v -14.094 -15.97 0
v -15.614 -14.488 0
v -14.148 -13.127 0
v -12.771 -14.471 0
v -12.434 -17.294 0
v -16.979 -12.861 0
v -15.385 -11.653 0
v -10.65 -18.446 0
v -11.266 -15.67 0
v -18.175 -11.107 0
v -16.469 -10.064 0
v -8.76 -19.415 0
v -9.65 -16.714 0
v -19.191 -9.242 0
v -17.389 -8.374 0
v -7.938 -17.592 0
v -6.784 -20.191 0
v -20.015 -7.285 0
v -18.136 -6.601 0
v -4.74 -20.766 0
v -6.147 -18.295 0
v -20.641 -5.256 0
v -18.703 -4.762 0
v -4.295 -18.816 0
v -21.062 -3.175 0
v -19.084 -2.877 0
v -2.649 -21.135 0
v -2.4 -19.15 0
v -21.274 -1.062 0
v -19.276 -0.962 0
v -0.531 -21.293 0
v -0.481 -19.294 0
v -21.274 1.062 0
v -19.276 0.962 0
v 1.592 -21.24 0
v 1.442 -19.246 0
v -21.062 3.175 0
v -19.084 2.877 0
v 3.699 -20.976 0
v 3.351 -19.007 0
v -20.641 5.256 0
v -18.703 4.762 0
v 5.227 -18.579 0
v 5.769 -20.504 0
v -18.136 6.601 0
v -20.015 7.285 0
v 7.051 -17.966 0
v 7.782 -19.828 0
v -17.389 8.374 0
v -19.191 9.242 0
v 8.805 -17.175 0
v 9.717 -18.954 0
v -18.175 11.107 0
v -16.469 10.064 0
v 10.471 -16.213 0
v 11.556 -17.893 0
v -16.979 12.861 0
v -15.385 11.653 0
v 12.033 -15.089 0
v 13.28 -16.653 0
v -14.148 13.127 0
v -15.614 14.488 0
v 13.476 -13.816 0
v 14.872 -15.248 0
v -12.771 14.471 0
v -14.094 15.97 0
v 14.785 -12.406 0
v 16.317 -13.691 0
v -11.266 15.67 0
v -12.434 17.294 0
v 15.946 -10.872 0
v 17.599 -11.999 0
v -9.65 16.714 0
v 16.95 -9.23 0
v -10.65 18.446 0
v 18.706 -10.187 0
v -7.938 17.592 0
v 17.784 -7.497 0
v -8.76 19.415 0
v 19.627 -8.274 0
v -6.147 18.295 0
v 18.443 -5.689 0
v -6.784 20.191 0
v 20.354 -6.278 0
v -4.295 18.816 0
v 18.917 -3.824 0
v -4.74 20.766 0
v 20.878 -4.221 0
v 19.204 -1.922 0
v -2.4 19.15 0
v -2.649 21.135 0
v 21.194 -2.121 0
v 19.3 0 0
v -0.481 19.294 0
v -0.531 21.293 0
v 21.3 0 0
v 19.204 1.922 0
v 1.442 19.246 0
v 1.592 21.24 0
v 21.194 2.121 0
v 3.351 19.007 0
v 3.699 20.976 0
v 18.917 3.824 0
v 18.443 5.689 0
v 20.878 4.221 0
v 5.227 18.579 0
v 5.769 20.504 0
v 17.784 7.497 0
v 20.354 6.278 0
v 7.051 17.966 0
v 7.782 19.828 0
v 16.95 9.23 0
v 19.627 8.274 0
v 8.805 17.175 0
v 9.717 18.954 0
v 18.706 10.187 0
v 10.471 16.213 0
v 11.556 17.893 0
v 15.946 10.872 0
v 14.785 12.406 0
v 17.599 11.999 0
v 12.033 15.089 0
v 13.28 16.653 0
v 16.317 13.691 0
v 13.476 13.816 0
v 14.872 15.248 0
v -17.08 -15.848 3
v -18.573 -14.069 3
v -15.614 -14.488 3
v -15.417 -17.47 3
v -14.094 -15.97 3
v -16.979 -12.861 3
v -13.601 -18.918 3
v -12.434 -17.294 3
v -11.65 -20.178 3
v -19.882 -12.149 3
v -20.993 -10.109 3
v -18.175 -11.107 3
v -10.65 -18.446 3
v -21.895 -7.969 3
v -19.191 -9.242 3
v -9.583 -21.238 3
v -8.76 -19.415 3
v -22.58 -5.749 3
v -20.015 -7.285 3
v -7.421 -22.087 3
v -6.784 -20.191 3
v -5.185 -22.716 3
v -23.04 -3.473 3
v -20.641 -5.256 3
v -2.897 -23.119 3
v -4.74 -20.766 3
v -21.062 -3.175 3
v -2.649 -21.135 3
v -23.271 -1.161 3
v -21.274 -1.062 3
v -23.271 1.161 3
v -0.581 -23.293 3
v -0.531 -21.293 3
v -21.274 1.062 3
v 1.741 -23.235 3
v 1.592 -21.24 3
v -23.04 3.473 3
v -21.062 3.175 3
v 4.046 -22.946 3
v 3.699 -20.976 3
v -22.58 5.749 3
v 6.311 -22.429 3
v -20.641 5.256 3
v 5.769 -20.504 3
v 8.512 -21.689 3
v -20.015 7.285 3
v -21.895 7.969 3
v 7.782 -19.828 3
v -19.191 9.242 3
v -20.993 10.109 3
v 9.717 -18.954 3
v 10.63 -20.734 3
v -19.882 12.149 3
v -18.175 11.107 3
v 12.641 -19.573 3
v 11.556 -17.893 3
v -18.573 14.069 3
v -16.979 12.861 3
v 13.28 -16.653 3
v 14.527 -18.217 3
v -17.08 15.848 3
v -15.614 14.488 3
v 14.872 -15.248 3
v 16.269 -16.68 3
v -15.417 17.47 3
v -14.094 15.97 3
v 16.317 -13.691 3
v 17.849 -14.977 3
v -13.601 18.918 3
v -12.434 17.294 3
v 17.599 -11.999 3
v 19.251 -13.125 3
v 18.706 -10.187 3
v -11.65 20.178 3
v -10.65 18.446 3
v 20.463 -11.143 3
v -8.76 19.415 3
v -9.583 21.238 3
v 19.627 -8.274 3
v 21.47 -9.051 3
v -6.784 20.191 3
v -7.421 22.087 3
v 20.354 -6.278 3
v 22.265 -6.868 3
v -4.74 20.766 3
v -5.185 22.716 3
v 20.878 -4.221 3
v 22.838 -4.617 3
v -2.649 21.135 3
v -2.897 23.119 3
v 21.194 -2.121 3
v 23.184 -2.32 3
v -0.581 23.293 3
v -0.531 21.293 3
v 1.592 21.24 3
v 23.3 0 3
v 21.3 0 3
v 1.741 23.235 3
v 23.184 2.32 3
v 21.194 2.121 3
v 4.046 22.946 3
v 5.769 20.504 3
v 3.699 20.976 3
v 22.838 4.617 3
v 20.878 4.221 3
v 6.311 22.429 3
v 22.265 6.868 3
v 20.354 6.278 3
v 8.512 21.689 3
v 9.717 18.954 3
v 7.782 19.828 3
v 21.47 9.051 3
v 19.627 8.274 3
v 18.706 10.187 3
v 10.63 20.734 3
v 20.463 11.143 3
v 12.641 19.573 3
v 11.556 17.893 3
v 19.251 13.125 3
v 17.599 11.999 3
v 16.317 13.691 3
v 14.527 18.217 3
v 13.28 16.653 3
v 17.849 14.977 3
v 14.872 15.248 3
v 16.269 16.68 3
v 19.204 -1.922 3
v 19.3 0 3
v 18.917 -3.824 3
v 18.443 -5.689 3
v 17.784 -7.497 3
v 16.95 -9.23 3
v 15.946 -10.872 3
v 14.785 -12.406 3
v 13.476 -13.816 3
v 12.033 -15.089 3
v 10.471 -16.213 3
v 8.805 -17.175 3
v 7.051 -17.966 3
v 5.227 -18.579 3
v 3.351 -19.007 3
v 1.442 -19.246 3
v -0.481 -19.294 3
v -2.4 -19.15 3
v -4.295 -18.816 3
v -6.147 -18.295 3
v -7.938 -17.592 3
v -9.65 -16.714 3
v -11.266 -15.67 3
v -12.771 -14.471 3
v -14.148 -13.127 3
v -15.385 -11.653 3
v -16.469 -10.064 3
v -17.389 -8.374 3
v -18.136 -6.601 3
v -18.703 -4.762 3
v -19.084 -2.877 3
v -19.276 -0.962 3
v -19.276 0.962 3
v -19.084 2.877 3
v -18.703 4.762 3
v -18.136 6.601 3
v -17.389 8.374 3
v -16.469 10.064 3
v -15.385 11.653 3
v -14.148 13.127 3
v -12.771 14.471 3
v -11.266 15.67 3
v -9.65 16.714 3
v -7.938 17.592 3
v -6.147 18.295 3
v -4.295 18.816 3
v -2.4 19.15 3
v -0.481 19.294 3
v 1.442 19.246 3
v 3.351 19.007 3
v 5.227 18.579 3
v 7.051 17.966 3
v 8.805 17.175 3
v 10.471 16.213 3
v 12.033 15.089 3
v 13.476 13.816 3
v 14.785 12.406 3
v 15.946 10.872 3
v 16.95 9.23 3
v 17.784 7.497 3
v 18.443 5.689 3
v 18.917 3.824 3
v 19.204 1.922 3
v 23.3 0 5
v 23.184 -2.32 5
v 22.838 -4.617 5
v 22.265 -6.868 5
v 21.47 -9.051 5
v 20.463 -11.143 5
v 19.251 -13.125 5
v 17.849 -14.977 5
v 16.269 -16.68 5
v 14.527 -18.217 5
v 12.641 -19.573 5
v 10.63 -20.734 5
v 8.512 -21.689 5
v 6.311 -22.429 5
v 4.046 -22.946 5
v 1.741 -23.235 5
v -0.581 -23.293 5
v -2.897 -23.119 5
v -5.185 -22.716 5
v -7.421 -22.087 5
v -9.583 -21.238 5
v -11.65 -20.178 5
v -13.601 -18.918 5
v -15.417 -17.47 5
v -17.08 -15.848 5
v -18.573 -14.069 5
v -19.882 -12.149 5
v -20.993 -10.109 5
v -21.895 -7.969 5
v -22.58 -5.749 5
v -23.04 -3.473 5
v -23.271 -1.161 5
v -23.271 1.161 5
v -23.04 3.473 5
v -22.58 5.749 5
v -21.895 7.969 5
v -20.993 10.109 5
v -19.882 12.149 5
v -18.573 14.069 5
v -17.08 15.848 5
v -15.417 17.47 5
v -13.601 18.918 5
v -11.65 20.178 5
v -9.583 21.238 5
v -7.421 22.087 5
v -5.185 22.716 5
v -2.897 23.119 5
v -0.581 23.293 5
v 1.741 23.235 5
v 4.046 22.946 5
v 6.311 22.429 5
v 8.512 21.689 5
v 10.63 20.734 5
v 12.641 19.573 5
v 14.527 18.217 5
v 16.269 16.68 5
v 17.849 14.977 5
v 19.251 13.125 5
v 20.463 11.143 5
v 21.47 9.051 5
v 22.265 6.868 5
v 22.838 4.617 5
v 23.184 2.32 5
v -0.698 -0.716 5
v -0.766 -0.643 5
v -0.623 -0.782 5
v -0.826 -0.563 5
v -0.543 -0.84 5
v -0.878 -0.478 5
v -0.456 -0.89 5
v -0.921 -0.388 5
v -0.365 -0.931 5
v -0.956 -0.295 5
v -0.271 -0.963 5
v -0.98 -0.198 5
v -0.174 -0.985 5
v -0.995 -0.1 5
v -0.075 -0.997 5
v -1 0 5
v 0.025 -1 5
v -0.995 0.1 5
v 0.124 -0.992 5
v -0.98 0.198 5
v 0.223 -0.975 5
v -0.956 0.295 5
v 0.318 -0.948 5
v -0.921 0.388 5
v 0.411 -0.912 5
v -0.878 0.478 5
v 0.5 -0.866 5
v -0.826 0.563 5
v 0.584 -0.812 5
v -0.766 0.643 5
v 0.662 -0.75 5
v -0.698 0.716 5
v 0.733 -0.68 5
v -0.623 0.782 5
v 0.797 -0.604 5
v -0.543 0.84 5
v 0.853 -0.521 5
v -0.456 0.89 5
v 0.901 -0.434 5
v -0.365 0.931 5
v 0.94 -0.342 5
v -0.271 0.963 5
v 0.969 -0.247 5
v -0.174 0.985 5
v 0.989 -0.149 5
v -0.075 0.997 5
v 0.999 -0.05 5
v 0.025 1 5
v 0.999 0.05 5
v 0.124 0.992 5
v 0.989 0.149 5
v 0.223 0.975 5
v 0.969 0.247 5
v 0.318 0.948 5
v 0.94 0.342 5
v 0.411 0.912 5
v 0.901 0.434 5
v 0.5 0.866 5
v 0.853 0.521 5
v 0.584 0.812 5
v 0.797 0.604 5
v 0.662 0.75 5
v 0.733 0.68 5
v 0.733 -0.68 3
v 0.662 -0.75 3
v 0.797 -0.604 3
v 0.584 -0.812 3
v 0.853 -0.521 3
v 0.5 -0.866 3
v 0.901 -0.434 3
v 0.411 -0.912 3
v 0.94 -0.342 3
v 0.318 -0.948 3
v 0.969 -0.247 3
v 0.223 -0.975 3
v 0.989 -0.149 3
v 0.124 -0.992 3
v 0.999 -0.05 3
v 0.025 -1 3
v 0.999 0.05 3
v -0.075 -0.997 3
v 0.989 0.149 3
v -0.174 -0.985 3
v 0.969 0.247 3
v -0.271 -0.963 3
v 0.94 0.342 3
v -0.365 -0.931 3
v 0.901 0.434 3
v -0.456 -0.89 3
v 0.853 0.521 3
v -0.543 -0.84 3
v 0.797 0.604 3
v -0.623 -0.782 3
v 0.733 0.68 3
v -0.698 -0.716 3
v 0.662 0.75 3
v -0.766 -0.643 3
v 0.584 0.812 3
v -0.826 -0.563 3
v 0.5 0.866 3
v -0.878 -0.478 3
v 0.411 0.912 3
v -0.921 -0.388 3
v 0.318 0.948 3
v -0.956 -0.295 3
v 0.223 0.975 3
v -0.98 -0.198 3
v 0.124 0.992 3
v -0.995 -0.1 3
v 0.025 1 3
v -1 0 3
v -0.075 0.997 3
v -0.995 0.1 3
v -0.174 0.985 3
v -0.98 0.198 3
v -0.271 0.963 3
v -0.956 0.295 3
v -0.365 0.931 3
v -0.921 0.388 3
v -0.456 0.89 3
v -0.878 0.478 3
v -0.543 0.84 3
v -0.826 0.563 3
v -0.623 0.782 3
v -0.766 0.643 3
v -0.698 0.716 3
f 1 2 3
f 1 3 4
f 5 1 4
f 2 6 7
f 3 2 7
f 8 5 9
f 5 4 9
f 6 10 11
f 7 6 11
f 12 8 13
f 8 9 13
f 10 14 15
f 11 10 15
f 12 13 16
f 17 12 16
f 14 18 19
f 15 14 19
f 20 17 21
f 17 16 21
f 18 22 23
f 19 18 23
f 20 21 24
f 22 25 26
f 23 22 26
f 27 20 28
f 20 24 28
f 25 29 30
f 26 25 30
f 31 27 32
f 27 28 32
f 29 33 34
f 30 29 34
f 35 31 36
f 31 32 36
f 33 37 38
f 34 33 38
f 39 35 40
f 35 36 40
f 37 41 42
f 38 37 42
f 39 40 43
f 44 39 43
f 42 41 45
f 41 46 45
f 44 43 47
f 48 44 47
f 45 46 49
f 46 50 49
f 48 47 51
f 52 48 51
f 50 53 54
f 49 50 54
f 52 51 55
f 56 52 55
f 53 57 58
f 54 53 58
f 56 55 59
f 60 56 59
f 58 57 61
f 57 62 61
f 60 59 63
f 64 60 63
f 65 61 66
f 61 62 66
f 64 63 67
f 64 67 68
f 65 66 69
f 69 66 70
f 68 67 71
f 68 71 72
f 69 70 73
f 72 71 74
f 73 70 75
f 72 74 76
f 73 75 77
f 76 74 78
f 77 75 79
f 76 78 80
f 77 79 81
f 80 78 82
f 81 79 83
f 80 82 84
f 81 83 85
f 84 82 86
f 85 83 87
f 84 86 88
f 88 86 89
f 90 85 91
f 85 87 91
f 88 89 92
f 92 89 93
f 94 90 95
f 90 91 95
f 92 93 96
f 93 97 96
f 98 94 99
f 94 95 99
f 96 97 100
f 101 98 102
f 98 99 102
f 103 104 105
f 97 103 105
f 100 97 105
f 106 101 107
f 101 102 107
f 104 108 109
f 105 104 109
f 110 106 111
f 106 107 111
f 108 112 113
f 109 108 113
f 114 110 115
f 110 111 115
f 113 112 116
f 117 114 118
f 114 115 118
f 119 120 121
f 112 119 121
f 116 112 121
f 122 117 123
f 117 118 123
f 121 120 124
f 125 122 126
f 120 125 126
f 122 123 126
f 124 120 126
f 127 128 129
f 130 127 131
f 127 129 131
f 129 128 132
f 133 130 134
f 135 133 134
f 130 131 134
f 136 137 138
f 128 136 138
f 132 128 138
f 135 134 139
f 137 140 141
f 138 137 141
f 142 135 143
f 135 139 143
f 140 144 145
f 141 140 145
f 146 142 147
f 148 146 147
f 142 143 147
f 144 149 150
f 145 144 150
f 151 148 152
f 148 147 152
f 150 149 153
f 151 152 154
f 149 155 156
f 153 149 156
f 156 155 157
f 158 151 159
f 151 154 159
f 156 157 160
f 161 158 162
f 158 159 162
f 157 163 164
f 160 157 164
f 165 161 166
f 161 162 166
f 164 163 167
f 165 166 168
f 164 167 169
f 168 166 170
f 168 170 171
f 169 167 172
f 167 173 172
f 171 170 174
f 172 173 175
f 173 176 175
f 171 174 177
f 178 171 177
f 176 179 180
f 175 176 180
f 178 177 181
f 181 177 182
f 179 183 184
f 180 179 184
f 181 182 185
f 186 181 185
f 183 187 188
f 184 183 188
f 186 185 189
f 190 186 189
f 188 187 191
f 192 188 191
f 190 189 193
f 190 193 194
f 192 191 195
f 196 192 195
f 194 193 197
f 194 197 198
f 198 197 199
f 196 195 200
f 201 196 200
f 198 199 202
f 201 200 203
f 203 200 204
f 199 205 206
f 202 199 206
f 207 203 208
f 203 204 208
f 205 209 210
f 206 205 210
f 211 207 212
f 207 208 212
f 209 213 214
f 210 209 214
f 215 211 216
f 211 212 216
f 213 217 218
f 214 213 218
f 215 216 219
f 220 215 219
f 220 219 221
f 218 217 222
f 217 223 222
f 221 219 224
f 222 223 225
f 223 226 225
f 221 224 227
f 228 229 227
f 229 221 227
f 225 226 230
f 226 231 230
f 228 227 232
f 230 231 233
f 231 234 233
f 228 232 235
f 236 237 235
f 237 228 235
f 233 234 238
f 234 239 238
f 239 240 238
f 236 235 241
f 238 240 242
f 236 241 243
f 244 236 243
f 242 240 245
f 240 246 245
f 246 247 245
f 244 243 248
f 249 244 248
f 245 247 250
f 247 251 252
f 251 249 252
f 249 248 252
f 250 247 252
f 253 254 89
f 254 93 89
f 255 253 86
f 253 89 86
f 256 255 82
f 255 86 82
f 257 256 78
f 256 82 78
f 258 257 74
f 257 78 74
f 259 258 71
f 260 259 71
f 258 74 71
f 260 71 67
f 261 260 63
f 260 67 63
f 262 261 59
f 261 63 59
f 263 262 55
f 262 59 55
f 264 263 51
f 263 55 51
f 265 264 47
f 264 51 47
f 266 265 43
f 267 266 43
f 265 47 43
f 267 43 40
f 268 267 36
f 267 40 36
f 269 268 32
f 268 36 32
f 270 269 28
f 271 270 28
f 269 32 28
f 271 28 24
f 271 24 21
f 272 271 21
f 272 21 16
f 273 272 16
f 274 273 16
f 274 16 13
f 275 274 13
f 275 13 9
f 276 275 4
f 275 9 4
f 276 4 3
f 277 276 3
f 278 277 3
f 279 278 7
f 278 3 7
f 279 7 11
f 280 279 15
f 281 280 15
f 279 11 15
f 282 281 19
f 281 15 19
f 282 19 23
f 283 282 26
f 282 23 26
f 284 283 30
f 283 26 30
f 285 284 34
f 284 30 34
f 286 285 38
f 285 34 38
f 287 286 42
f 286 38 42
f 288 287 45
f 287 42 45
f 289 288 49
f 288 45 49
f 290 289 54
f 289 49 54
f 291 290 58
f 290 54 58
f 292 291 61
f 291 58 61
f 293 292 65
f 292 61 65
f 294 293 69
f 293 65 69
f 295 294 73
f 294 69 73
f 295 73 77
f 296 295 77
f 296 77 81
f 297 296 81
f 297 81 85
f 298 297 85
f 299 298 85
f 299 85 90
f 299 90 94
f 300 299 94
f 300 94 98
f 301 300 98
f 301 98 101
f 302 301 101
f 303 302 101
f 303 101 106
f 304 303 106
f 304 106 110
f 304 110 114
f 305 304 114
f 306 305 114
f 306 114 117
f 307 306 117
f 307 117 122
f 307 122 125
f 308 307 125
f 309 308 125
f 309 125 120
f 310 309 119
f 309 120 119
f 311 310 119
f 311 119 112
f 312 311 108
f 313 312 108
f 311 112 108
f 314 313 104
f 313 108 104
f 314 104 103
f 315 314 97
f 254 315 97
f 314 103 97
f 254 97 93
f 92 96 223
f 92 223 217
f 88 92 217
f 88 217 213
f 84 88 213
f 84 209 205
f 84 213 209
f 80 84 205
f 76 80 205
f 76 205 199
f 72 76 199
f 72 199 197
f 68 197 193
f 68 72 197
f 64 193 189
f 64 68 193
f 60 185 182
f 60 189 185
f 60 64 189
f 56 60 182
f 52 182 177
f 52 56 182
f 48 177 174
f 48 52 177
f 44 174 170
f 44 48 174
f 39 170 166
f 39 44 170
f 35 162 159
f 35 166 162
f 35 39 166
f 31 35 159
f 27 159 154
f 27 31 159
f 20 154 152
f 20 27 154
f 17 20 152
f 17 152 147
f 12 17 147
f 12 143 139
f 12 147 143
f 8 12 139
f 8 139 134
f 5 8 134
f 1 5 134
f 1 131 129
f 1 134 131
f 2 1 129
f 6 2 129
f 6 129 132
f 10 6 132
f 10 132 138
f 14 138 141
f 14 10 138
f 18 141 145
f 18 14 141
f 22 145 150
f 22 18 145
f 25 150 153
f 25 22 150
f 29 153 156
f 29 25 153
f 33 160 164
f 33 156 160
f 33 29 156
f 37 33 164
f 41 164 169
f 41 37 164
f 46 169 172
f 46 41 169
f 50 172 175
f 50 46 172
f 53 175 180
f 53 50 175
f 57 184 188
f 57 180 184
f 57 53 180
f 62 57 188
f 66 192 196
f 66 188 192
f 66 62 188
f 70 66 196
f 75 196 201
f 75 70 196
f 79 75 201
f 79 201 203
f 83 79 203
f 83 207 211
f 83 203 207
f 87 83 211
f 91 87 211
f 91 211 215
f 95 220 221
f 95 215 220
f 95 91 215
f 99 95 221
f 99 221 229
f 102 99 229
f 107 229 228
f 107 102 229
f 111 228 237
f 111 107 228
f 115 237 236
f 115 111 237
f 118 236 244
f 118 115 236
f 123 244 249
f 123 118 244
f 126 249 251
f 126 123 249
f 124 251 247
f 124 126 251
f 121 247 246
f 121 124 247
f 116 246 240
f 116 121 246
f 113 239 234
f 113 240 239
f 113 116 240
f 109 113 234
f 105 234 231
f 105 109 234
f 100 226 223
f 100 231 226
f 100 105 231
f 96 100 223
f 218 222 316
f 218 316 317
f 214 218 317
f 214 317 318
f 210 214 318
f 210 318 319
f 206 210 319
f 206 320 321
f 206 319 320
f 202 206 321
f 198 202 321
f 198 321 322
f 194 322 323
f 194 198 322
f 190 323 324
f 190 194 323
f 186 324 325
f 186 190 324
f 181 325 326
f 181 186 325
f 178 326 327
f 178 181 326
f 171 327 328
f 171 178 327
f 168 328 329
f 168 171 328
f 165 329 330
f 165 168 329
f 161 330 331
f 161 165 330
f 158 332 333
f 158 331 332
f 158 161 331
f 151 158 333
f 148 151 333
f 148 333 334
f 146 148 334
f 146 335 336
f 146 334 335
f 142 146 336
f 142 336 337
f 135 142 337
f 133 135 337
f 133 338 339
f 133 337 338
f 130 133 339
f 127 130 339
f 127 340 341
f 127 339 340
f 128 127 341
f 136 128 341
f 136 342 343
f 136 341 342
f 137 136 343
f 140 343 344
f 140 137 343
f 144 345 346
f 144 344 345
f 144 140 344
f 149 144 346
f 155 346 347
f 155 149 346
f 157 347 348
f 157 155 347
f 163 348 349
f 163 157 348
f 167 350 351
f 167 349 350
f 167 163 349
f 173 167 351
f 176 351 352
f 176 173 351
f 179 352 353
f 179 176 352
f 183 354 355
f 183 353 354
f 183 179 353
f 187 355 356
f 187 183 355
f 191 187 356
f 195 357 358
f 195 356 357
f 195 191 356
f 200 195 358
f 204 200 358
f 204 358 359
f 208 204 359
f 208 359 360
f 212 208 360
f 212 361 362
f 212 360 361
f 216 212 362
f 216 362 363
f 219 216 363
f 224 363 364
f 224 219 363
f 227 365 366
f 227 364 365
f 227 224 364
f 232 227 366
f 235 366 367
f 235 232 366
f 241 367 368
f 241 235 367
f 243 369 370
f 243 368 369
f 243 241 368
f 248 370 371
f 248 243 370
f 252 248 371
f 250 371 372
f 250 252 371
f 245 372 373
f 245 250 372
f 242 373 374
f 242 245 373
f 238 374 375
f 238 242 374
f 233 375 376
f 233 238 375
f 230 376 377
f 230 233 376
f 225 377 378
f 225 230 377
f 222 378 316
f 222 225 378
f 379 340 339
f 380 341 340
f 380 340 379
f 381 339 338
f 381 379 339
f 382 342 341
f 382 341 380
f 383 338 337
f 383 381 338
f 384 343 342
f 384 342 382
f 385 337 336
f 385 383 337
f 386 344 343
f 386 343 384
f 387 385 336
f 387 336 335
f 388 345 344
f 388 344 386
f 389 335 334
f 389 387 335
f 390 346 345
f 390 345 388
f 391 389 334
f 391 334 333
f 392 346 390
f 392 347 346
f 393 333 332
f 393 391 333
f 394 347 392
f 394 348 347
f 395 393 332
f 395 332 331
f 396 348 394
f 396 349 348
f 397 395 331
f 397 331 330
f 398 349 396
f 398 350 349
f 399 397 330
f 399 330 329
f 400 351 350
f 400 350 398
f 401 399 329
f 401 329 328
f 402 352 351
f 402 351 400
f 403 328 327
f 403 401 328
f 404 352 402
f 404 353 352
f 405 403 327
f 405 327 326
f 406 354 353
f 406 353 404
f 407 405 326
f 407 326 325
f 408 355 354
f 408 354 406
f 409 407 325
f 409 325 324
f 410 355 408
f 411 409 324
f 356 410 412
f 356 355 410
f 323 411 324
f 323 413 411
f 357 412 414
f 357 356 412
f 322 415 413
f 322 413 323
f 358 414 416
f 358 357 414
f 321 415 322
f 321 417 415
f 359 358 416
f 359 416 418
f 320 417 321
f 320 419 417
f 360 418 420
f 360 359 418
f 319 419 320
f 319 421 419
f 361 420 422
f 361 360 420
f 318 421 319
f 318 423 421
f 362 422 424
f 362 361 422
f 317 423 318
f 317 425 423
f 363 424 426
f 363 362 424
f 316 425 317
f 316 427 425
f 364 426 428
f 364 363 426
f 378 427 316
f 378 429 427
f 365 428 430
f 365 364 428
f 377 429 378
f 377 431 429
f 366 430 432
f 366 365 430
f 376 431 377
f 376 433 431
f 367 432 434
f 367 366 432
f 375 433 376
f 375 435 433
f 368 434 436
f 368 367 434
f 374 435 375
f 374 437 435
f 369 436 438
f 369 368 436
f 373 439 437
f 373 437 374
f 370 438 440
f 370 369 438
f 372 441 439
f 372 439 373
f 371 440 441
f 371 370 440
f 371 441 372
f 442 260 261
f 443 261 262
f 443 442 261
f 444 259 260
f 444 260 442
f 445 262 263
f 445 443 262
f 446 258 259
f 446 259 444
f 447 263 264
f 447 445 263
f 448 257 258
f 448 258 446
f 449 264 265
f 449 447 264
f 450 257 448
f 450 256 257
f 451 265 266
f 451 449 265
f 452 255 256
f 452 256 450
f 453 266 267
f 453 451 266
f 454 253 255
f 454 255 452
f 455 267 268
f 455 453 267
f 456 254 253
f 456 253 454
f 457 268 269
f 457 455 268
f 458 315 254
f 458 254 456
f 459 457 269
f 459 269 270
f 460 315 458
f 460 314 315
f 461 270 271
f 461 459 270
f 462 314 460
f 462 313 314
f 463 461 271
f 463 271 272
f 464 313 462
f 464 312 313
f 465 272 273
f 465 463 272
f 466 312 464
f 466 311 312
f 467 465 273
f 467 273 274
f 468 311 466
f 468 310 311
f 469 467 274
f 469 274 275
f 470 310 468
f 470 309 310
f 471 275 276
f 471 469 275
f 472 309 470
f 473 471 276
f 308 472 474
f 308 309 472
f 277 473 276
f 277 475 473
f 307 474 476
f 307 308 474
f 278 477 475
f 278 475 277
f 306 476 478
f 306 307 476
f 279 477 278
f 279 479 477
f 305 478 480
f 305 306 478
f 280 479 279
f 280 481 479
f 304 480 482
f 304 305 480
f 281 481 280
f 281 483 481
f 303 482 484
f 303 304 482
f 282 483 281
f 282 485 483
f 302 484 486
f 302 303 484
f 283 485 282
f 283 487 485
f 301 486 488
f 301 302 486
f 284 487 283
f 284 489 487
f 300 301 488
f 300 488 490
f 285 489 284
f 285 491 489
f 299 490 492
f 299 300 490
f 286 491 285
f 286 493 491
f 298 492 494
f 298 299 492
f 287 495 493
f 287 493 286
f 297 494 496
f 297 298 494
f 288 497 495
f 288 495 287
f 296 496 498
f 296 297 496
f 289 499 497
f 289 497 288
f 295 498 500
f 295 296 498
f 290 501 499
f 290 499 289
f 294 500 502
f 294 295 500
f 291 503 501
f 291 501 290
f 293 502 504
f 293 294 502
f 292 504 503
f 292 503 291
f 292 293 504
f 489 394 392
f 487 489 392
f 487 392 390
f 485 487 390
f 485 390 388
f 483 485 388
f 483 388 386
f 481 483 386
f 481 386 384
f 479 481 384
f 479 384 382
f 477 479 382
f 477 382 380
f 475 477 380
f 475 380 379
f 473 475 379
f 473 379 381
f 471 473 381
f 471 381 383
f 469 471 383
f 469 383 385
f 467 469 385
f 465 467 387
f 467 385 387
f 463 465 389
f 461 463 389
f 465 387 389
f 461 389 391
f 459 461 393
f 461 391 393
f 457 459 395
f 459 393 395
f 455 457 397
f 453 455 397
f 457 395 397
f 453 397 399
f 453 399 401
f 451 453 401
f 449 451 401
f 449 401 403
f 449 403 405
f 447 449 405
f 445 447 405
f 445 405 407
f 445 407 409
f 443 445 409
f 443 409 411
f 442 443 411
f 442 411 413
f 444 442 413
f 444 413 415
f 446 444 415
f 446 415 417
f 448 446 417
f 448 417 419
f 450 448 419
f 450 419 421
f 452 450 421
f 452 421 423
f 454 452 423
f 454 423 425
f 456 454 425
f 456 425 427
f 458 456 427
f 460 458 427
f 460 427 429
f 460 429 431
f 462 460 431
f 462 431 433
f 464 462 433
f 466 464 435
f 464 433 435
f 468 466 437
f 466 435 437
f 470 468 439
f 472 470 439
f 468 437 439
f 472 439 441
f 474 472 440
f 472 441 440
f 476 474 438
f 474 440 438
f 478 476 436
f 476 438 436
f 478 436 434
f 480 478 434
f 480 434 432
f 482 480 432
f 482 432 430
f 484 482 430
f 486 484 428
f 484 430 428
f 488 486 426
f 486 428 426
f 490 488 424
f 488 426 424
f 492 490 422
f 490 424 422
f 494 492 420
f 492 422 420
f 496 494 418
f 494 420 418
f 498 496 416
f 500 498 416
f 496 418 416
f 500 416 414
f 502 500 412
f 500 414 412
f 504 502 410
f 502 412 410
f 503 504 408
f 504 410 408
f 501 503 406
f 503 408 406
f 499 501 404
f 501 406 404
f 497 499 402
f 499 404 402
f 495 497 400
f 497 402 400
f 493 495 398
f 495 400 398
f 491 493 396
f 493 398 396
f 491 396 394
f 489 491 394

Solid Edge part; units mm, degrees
sketch "Sketch1" plane through (0, 0, 0) normal (0, 0, 1) x (1, 0, 0)
  circle A0 centre (0, 0) radius 21.3
extrude "Protrusion1" add sketch "Sketch1" along normal blind 3
sketch "Sketch2" plane through (0, 0, 3) normal (0, 0, 1) x (1, 0, 0)
  circle A0 centre (0, 0) radius 23.3
extrude "ExtrudedProtrusion_2" add sketch "Sketch2" along normal blind 2
sketch "Sketch3" plane through (0, 0, 0) normal (0, 0, -1) x (1, 0, 0)
  circle A0 centre (0, 0) radius 19.3
extrude "ExtrudedCutout_1" cut sketch "Sketch3" against normal blind 3
sketch "Sketch4" plane through (0, 0, 5) normal (0, 0, 1) x (-1, 0, 0)
  circle A0 centre (0, 0) radius 1
extrude "ExtrudedCutout_2" cut sketch "Sketch4" against normal blind 2
